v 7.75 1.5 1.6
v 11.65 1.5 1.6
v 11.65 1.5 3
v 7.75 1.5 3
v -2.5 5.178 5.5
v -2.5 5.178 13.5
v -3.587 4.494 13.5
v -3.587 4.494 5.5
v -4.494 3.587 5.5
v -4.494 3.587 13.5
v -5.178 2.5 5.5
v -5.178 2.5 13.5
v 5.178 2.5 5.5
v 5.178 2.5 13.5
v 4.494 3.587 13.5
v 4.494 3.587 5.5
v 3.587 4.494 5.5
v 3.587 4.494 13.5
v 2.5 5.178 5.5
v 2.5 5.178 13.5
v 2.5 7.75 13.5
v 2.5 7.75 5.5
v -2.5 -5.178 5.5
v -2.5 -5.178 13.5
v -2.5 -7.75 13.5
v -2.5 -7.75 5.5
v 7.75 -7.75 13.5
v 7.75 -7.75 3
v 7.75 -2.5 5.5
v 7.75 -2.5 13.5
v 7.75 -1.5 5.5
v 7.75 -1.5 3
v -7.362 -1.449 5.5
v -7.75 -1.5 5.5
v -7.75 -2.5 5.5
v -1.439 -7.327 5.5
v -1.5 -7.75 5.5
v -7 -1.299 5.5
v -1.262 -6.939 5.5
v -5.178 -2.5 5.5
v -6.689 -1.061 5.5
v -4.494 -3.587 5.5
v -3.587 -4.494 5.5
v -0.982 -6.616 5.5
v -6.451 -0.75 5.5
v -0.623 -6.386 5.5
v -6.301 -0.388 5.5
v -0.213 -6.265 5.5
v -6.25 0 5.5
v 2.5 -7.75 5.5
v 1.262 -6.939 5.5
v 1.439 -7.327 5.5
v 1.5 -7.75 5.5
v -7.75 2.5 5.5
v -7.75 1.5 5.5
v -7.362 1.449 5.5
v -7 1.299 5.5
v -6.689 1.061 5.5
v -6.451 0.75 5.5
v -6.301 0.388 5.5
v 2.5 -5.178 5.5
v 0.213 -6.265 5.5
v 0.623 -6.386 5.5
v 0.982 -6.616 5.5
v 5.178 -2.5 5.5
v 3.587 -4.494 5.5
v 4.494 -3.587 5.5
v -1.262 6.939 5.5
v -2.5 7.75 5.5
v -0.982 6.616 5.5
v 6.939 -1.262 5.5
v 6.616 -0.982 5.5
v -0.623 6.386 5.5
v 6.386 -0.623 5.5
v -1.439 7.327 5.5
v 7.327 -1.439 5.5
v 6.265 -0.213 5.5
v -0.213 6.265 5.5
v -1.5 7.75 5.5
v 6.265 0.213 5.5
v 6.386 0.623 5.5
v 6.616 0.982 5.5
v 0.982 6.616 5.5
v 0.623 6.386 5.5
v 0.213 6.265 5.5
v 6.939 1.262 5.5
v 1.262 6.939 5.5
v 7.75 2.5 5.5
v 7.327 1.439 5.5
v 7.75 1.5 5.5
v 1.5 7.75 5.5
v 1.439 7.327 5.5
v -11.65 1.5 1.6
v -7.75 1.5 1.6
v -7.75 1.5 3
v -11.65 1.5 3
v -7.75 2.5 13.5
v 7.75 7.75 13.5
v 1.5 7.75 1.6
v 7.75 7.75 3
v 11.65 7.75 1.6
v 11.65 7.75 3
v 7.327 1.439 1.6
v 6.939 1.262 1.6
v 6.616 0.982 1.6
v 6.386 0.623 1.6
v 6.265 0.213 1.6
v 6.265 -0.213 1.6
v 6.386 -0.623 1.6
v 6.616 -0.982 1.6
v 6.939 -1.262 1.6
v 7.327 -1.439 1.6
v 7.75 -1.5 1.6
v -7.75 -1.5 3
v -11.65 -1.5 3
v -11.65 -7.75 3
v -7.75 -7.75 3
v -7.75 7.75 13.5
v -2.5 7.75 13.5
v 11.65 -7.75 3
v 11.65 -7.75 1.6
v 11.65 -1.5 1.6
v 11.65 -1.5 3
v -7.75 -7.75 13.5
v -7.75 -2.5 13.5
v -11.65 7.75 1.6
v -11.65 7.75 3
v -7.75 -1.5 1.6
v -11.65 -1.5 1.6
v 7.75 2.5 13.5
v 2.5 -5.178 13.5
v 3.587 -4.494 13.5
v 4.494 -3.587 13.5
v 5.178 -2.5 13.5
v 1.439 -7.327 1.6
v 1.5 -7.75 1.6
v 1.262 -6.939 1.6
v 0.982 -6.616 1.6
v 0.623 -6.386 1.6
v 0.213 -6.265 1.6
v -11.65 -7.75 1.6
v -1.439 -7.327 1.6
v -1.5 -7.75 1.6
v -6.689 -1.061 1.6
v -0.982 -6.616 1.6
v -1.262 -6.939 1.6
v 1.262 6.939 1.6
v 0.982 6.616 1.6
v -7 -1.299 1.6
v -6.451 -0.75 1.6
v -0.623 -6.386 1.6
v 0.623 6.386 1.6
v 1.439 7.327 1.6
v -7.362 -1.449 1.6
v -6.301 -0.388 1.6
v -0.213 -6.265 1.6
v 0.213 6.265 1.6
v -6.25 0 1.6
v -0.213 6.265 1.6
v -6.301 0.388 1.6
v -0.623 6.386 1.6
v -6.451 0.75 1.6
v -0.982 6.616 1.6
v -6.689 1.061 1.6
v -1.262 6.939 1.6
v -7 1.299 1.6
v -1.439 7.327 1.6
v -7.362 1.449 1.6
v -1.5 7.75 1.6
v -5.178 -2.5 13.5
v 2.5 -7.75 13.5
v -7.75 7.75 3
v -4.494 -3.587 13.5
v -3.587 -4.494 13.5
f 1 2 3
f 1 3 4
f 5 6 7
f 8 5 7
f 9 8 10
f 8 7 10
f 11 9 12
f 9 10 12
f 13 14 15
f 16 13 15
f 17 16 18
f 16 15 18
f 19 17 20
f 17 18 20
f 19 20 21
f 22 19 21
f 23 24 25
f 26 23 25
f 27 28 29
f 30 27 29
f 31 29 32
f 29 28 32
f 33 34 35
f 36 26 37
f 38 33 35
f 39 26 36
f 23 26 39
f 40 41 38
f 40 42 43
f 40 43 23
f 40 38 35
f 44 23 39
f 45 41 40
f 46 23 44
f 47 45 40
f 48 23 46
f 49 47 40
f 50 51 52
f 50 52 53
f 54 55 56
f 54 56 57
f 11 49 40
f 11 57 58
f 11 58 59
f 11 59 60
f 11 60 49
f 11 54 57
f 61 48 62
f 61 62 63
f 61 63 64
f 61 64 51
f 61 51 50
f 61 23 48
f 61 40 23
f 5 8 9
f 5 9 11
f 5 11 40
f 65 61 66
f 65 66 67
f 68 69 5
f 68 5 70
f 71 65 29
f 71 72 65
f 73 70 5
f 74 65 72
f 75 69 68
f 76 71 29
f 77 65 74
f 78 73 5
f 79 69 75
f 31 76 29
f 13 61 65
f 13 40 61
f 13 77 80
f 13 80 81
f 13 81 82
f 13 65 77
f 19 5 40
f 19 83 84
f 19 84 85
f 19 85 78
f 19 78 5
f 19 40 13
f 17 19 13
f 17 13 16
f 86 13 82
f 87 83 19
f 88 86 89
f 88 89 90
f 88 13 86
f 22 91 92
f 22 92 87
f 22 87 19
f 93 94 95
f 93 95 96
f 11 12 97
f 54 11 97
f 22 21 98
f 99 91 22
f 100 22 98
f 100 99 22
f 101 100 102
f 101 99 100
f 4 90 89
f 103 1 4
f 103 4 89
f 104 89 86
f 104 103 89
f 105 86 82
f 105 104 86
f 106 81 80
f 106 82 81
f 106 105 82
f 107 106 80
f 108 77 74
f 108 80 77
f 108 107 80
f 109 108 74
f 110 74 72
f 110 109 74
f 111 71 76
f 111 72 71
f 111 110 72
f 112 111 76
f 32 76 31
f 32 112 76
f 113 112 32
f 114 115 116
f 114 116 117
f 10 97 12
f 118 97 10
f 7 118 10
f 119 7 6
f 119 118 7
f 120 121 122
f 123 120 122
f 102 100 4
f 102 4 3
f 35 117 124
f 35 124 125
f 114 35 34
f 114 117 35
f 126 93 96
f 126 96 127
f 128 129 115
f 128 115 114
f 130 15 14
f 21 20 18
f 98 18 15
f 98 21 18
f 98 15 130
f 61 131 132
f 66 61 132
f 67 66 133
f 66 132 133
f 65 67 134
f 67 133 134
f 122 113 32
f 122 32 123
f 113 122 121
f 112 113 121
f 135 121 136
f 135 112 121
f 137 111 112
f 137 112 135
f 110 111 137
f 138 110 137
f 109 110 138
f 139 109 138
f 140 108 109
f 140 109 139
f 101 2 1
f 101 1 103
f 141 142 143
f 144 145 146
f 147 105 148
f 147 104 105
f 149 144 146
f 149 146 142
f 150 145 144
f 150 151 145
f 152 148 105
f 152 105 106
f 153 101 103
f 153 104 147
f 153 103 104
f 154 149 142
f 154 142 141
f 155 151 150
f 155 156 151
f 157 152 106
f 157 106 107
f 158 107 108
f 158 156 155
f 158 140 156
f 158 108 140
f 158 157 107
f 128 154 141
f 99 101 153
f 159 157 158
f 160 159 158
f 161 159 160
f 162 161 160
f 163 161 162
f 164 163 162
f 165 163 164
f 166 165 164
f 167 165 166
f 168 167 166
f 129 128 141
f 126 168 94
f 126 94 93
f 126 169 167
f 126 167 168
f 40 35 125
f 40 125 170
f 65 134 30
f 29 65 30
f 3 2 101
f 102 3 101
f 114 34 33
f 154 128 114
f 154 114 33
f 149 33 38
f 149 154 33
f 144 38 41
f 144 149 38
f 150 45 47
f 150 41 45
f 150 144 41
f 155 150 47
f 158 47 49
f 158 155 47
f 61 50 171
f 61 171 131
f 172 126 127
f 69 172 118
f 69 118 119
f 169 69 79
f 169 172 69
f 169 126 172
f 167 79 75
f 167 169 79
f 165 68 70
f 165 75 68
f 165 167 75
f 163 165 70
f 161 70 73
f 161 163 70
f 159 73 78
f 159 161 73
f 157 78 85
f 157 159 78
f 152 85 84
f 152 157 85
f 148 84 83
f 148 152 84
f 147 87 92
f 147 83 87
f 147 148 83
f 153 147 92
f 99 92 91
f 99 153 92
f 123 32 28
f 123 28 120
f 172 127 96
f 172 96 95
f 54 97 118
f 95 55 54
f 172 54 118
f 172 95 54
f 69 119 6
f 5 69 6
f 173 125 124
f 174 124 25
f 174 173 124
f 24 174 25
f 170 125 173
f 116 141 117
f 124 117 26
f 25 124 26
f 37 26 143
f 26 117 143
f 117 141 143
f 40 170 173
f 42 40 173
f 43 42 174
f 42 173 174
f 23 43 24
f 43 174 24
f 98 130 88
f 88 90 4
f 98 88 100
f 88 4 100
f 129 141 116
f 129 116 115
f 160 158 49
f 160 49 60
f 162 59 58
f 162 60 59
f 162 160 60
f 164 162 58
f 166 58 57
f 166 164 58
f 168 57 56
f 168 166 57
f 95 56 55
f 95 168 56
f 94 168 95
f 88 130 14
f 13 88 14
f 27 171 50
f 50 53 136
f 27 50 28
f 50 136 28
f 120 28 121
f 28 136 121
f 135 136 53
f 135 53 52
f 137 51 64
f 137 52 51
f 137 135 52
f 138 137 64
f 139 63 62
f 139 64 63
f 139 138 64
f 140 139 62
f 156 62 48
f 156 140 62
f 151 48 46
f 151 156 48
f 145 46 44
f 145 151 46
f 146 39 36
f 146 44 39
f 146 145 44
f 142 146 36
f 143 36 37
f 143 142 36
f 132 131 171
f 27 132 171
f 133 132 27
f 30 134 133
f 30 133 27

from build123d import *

# Parameters (mm, degrees)
SKETCH1_W               = 23.3
SKETCH1_H               = 15.5
BOSS_EXTRUDE1_DEPTH     = 3
SKETCH2_W               = 15.5
SKETCH2_H               = 15.5
BOSS_EXTRUDE2_DEPTH     = 10.5
CUT_EXTRUDE1_DEPTH      = 8
CUT_EXTRUDE2_DEPTH      = 10
CUT_EXTRUDE2_DEPTH_BACK = 3
SKETCH4_R               = 1.5
SKETCH5_W               = 35.704226427
SKETCH5_H               = 23.298790068
CUT_EXTRUDE3_DEPTH      = 1.6


with BuildPart() as part:
    # Sketch1 → Boss-Extrude1 (new body)
    with BuildSketch(Plane.XY):
        Rectangle(SKETCH1_W, SKETCH1_H)
    extrude(amount=BOSS_EXTRUDE1_DEPTH)

    # Sketch2 → Boss-Extrude2 (add)
    with BuildSketch(Plane.XY.offset(3)):
        Rectangle(SKETCH2_W, SKETCH2_H)
    extrude(amount=BOSS_EXTRUDE2_DEPTH)

    # Sketch3 → Cut-Extrude1 (cut)
    with BuildSketch(Plane.XY.offset(13.5)):
        with BuildLine():
            Line((-2.5, 4.304165553), (-2.5, 5.178078794))
            ThreePointArc((-2.5, 5.178078794), (-4.065863992, 4.065863992), (-5.178078794, 2.5))
            Line((-5.178078794, 2.5), (-5.178078794, -2.5))
            ThreePointArc((-5.178078794, -2.5), (-4.065863992, -4.065863992), (-2.5, -5.178078794))
            Line((-2.5, -5.178078794), (-2.5, -3.82452247))
            Line((-2.5, -3.82452247), (2.5, -3.82452247))
            Line((2.5, -3.82452247), (2.5, -5.178078794))
            ThreePointArc((2.5, -5.178078794), (4.065863992, -4.065863992), (5.178078794, -2.5))
            Line((5.178078794, -2.5), (3.988610893, -2.5))
            Line((3.988610893, -2.5), (3.988610893, 2.5))
            Line((3.988610893, 2.5), (5.178078794, 2.5))
            ThreePointArc((5.178078794, 2.5), (4.065863992, 4.065863992), (2.5, 5.178078794))
            Line((2.5, 5.178078794), (2.5, 4.304165553))
            Line((2.5, 4.304165553), (-2.5, 4.304165553))
        make_face()
        with BuildLine():
            Line((-5.178078794, -2.5), (-5.178078794, 2.5))
            ThreePointArc((-5.178078794, 2.5), (-5.75, 0), (-5.178078794, -2.5))
        make_face()
        with BuildLine():
            ThreePointArc((-5.178078794, -2.5), (-5.75, 0), (-5.178078794, 2.5))
            Line((-5.178078794, 2.5), (-7.75, 2.5))
            Line((-7.75, 2.5), (-7.75, -2.5))
            Line((-7.75, -2.5), (-5.178078794, -2.5))
        make_face()
        with BuildLine():
            ThreePointArc((2.5, 5.178078794), (0, 5.75), (-2.5, 5.178078794))
            Line((-2.5, 5.178078794), (-2.5, 4.304165553))
            Line((-2.5, 4.304165553), (2.5, 4.304165553))
            Line((2.5, 4.304165553), (2.5, 5.178078794))
        make_face()
        with BuildLine():
            Line((2.5, 7.75), (-2.5, 7.75))
            Line((-2.5, 7.75), (-2.5, 5.178078794))
            ThreePointArc((-2.5, 5.178078794), (0, 5.75), (2.5, 5.178078794))
            Line((2.5, 5.178078794), (2.5, 7.75))
        make_face()
        with BuildLine():
            Line((7.75, 2.5), (5.178078794, 2.5))
            ThreePointArc((5.178078794, 2.5), (5.605196387, 1.28229227), (5.75, 0))
            ThreePointArc((5.75, 0), (5.605196387, -1.28229227), (5.178078794, -2.5))
            Line((5.178078794, -2.5), (7.75, -2.5))
            Line((7.75, -2.5), (7.75, 2.5))
        make_face()
        with BuildLine():
            ThreePointArc((5.75, 0), (5.605196387, 1.28229227), (5.178078794, 2.5))
            Line((5.178078794, 2.5), (3.988610893, 2.5))
            Line((3.988610893, 2.5), (3.988610893, -2.5))
            Line((3.988610893, -2.5), (5.178078794, -2.5))
            ThreePointArc((5.178078794, -2.5), (5.605196387, -1.28229227), (5.75, 0))
        make_face()
        with BuildLine():
            Line((-2.5, -3.82452247), (-2.5, -5.178078794))
            ThreePointArc((-2.5, -5.178078794), (0, -5.75), (2.5, -5.178078794))
            Line((2.5, -5.178078794), (2.5, -3.82452247))
            Line((2.5, -3.82452247), (-2.5, -3.82452247))
        make_face()
        with BuildLine():
            ThreePointArc((2.5, -5.178078794), (0, -5.75), (-2.5, -5.178078794))
            Line((-2.5, -5.178078794), (-2.5, -7.75))
            Line((-2.5, -7.75), (2.5, -7.75))
            Line((2.5, -7.75), (2.5, -5.178078794))
        make_face()
    extrude(amount=-CUT_EXTRUDE1_DEPTH, mode=Mode.SUBTRACT)

    # Sketch4 → Cut-Extrude2 (cut, two sides: drawn at the far end of the back side and taken through both)
    with BuildSketch(Plane.XY.offset(3).offset(-CUT_EXTRUDE2_DEPTH_BACK)):
        with Locations((0, 7.75)):
            Circle(SKETCH4_R)
        with Locations((7.75, 0)):
            Circle(SKETCH4_R)
        with BuildLine():
            Line((11.65, 1.5), (7.75, 1.5))
            ThreePointArc((7.75, 1.5), (8.810660172, 1.060660172), (9.25, 0))
            ThreePointArc((9.25, 0), (8.810660172, -1.060660172), (7.75, -1.5))
            Line((7.75, -1.5), (11.65, -1.5))
            Line((11.65, -1.5), (11.65, 1.5))
        make_face()
        with BuildLine():
            ThreePointArc((-7.75, -1.5), (-9.25, 0), (-7.75, 1.5))
            Line((-7.75, 1.5), (-11.65, 1.5))
            Line((-11.65, 1.5), (-11.65, -1.5))
            Line((-11.65, -1.5), (-7.75, -1.5))
        make_face()
        with BuildLine():
            Line((-7.75, -1.5), (-7.75, 1.5))
            ThreePointArc((-7.75, 1.5), (-9.25, 0), (-7.75, -1.5))
        make_face()
        with BuildLine():
            ThreePointArc((-6.25, 0), (-6.689339828, 1.060660172), (-7.75, 1.5))
            Line((-7.75, 1.5), (-7.75, -1.5))
            ThreePointArc((-7.75, -1.5), (-6.689339828, -1.060660172), (-6.25, 0))
        make_face()
        with Locations((0, -7.75)):
            Circle(SKETCH4_R)
    extrude(amount=CUT_EXTRUDE2_DEPTH + CUT_EXTRUDE2_DEPTH_BACK, mode=Mode.SUBTRACT)

    # Sketch5 → Cut-Extrude3 (cut)
    with BuildSketch(Plane(origin=(0, 0, 0), x_dir=(-1, 0, 0), z_dir=(0, 0, -1))):
        with Locations((1.840090656, -1.042081913)):
            Rectangle(SKETCH5_W, SKETCH5_H)
    extrude(amount=-CUT_EXTRUDE3_DEPTH, mode=Mode.SUBTRACT)


solid = part.part
